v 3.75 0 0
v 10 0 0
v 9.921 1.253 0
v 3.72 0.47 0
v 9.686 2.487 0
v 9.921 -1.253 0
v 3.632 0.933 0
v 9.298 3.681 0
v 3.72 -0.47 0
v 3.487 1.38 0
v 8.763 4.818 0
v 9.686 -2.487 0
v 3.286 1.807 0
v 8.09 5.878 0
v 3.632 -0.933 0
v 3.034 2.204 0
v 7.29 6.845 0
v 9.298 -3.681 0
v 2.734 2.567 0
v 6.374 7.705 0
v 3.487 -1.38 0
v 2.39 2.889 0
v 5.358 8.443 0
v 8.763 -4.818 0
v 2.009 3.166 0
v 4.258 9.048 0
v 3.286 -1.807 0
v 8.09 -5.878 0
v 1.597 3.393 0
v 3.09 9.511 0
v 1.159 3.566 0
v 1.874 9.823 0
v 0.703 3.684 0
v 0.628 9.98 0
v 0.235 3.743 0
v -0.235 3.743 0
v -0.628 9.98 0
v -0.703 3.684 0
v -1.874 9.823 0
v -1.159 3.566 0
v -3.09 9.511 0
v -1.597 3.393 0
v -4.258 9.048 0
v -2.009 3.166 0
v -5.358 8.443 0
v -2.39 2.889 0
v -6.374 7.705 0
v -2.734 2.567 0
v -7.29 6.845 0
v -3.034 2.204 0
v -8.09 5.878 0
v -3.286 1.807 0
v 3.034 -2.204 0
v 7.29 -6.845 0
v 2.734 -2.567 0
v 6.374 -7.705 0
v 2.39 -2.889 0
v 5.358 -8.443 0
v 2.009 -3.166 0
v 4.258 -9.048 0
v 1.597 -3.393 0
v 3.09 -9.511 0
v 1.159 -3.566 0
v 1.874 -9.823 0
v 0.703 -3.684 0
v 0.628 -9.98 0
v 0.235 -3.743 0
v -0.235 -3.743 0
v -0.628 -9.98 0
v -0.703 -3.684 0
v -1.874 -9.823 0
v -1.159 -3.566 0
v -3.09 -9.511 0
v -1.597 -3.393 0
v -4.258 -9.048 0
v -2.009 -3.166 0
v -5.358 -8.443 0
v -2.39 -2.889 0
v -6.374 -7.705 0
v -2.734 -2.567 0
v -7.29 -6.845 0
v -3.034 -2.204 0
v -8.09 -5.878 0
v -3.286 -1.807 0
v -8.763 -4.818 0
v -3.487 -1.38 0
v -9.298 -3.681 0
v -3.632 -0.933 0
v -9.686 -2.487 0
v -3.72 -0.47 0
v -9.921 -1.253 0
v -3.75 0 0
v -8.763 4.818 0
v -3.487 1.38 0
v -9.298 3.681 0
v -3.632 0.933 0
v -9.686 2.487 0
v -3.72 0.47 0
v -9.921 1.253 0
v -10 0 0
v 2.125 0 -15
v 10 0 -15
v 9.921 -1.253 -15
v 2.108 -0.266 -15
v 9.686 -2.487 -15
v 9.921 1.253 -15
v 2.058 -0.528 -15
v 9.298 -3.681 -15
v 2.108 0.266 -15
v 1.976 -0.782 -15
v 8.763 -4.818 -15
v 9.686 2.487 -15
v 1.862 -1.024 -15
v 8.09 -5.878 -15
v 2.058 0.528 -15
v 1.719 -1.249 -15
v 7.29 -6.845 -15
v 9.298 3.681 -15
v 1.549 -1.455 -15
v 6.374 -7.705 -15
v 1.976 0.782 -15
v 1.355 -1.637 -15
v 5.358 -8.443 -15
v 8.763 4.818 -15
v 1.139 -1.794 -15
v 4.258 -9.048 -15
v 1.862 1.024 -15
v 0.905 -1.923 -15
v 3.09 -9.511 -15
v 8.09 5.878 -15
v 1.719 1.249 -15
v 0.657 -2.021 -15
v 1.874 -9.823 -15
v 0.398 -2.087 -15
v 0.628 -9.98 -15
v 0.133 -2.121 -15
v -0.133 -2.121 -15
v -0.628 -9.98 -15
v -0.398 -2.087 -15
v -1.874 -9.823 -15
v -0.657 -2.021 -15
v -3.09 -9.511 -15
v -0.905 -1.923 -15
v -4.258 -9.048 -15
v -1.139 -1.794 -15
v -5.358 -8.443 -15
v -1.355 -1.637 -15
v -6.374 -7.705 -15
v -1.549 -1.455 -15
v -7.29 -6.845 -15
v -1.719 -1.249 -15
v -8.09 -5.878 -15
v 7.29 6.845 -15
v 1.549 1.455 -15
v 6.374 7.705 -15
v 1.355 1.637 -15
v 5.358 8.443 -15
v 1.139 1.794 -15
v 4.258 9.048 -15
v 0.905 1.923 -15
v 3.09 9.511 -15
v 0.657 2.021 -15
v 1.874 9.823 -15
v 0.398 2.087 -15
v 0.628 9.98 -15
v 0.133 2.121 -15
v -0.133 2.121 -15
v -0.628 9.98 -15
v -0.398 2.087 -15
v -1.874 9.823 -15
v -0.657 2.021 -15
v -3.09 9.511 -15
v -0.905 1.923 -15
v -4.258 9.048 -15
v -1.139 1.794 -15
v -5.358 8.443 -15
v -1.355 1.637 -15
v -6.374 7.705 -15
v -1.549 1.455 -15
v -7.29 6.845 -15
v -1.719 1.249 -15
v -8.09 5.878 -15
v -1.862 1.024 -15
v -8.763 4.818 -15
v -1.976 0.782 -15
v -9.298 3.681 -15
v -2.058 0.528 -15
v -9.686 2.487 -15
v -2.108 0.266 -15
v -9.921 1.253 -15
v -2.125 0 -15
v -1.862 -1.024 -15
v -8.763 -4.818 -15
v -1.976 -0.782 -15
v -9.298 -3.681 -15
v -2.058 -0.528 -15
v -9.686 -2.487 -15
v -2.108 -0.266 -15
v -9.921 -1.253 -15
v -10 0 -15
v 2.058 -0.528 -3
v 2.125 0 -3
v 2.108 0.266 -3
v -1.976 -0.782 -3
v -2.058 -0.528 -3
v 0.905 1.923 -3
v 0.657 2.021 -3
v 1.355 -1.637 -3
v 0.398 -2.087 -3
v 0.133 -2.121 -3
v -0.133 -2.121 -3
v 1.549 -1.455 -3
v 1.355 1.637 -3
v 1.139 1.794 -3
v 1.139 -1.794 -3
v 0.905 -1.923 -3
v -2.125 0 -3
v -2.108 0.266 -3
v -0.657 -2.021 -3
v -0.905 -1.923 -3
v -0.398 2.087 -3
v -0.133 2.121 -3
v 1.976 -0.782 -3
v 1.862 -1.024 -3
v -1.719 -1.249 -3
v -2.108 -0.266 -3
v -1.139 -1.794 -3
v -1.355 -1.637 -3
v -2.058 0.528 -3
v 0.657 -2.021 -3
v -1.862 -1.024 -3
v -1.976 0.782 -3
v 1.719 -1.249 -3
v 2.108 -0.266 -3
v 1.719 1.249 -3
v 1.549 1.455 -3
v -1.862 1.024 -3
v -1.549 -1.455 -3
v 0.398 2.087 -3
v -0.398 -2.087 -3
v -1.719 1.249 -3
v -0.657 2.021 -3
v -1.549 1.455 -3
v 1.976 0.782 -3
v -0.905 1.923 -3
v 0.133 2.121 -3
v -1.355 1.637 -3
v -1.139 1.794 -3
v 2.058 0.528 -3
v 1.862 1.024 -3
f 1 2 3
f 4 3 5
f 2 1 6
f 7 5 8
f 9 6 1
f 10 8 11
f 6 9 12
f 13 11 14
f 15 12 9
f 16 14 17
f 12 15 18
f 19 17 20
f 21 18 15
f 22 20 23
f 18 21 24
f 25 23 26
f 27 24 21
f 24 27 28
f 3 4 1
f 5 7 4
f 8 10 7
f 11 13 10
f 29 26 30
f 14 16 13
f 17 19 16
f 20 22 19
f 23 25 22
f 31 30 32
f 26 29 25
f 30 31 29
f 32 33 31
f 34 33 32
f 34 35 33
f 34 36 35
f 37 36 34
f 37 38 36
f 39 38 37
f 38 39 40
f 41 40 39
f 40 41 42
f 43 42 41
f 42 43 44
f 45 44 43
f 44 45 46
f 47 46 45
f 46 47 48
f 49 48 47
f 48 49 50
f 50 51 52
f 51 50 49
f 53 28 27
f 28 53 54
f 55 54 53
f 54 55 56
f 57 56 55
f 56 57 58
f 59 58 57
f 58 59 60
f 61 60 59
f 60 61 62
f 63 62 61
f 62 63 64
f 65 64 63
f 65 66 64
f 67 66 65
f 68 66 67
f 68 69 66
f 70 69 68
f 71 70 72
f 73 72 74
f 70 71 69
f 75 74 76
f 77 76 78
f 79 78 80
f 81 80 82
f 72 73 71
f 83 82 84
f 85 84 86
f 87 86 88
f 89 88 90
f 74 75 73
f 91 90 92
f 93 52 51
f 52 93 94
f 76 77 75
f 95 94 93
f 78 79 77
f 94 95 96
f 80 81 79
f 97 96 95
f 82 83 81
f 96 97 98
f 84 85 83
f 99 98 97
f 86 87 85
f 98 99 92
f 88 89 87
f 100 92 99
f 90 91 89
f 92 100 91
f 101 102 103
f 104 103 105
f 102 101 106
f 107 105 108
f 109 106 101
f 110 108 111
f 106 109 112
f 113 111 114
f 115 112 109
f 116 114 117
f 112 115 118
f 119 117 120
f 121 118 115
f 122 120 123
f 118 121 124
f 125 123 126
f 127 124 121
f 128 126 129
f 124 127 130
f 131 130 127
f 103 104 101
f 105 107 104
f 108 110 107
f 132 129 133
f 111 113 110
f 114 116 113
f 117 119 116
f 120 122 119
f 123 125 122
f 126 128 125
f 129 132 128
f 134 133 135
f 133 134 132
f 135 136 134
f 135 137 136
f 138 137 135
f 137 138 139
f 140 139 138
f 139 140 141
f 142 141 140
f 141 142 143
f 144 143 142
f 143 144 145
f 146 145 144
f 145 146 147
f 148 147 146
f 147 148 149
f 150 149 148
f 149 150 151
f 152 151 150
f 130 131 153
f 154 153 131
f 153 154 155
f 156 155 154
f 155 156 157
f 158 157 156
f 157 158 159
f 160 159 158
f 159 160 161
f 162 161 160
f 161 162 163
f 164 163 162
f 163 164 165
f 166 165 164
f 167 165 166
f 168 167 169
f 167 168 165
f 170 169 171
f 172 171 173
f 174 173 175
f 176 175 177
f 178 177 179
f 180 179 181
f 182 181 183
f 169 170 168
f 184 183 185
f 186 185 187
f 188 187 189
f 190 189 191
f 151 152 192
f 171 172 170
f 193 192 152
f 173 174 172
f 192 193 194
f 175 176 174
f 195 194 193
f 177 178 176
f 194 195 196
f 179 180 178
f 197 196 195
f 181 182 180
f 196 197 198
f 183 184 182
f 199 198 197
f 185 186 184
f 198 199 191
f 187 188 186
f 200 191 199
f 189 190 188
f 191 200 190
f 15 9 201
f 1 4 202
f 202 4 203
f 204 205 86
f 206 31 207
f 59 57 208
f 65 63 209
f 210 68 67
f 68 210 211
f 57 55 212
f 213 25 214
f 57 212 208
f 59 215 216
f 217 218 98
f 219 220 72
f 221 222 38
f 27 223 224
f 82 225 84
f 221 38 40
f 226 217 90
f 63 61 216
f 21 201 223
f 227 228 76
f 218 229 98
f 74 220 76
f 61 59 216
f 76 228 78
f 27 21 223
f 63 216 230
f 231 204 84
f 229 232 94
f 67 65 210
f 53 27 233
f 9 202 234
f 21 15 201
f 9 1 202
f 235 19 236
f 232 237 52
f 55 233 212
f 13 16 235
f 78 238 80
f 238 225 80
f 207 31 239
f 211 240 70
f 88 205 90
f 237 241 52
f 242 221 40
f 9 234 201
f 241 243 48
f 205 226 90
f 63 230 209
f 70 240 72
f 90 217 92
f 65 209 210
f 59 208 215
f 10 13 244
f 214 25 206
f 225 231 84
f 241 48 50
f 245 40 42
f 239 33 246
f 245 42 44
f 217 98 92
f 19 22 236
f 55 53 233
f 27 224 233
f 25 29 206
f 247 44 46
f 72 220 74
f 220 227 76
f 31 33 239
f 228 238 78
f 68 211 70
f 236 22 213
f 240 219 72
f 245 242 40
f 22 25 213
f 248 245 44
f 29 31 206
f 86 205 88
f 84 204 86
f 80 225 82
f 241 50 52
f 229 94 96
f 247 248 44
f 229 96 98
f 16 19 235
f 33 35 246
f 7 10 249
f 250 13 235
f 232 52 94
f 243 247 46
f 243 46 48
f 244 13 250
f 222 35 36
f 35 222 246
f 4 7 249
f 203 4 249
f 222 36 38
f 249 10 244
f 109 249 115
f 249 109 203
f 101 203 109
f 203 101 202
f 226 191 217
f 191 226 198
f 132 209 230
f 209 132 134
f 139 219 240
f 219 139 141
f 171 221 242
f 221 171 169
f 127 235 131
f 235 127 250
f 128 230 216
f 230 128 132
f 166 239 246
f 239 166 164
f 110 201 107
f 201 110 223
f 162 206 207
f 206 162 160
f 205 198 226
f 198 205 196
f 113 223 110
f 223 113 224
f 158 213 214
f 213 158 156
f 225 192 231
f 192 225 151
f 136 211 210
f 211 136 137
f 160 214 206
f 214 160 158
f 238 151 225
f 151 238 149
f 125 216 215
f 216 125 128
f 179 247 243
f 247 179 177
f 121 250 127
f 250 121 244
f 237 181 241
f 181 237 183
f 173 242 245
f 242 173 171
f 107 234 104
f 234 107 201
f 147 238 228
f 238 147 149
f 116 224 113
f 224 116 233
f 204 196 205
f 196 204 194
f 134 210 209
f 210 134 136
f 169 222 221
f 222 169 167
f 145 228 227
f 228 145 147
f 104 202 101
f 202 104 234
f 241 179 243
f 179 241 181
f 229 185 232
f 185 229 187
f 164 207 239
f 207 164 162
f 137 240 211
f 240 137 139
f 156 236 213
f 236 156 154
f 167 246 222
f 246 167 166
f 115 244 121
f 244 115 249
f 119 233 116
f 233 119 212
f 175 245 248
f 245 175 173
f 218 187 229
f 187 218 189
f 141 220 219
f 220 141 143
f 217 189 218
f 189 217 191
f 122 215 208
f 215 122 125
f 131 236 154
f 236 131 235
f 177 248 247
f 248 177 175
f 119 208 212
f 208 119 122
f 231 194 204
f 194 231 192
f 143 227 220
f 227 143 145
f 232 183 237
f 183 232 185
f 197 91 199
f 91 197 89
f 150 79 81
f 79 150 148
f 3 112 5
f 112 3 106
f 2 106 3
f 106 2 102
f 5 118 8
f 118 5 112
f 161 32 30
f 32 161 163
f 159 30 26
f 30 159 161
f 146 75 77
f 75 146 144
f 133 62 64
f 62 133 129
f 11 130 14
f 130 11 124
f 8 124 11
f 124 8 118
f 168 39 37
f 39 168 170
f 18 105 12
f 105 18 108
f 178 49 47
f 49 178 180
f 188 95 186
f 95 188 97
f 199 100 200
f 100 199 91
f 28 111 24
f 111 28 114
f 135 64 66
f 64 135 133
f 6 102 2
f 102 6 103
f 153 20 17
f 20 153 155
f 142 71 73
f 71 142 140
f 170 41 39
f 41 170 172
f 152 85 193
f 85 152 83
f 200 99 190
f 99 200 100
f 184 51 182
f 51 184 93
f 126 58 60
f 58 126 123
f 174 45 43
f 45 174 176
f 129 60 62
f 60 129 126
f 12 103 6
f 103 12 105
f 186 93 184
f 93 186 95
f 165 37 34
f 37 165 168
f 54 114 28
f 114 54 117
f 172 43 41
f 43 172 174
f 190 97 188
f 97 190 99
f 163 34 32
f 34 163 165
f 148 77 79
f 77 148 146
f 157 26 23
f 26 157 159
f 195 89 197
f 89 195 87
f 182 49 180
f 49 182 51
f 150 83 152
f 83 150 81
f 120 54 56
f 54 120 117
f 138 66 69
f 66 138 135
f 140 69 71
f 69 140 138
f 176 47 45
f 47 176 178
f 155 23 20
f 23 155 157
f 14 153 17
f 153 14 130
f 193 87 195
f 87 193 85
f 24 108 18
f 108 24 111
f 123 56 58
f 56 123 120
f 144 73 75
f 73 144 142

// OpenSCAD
$fn = 50;


difference() {
	union() {
		translate(v = [0, 0, -15.0000000000]) {
			cylinder(h = 15, r = 10.0000000000);
		}
		cylinder(h = 0, r = 13.0000000000);
	}
	union() {
		translate(v = [0, 0, 0]) {
			rotate(a = [0, 0, 0]) {
				difference() {
					union() {
						#translate(v = [0, 0, -15.0000000000]) {
							cylinder(h = 15, r = 2.0000000000);
						}
						#translate(v = [0, 0, -3]) {
							cylinder(h = 3, r = 10.0000000000, r1 = 2.1250000000, r2 = 3.7500000000);
						}
						#translate(v = [0, 0, -15.0000000000]) {
							cylinder(h = 15, r = 2.1250000000);
						}
						#translate(v = [0, 0, -15.0000000000]) {
							cylinder(h = 15, r = 2.0000000000);
						}
					}
					union();
				}
			}
		}
	}
}
